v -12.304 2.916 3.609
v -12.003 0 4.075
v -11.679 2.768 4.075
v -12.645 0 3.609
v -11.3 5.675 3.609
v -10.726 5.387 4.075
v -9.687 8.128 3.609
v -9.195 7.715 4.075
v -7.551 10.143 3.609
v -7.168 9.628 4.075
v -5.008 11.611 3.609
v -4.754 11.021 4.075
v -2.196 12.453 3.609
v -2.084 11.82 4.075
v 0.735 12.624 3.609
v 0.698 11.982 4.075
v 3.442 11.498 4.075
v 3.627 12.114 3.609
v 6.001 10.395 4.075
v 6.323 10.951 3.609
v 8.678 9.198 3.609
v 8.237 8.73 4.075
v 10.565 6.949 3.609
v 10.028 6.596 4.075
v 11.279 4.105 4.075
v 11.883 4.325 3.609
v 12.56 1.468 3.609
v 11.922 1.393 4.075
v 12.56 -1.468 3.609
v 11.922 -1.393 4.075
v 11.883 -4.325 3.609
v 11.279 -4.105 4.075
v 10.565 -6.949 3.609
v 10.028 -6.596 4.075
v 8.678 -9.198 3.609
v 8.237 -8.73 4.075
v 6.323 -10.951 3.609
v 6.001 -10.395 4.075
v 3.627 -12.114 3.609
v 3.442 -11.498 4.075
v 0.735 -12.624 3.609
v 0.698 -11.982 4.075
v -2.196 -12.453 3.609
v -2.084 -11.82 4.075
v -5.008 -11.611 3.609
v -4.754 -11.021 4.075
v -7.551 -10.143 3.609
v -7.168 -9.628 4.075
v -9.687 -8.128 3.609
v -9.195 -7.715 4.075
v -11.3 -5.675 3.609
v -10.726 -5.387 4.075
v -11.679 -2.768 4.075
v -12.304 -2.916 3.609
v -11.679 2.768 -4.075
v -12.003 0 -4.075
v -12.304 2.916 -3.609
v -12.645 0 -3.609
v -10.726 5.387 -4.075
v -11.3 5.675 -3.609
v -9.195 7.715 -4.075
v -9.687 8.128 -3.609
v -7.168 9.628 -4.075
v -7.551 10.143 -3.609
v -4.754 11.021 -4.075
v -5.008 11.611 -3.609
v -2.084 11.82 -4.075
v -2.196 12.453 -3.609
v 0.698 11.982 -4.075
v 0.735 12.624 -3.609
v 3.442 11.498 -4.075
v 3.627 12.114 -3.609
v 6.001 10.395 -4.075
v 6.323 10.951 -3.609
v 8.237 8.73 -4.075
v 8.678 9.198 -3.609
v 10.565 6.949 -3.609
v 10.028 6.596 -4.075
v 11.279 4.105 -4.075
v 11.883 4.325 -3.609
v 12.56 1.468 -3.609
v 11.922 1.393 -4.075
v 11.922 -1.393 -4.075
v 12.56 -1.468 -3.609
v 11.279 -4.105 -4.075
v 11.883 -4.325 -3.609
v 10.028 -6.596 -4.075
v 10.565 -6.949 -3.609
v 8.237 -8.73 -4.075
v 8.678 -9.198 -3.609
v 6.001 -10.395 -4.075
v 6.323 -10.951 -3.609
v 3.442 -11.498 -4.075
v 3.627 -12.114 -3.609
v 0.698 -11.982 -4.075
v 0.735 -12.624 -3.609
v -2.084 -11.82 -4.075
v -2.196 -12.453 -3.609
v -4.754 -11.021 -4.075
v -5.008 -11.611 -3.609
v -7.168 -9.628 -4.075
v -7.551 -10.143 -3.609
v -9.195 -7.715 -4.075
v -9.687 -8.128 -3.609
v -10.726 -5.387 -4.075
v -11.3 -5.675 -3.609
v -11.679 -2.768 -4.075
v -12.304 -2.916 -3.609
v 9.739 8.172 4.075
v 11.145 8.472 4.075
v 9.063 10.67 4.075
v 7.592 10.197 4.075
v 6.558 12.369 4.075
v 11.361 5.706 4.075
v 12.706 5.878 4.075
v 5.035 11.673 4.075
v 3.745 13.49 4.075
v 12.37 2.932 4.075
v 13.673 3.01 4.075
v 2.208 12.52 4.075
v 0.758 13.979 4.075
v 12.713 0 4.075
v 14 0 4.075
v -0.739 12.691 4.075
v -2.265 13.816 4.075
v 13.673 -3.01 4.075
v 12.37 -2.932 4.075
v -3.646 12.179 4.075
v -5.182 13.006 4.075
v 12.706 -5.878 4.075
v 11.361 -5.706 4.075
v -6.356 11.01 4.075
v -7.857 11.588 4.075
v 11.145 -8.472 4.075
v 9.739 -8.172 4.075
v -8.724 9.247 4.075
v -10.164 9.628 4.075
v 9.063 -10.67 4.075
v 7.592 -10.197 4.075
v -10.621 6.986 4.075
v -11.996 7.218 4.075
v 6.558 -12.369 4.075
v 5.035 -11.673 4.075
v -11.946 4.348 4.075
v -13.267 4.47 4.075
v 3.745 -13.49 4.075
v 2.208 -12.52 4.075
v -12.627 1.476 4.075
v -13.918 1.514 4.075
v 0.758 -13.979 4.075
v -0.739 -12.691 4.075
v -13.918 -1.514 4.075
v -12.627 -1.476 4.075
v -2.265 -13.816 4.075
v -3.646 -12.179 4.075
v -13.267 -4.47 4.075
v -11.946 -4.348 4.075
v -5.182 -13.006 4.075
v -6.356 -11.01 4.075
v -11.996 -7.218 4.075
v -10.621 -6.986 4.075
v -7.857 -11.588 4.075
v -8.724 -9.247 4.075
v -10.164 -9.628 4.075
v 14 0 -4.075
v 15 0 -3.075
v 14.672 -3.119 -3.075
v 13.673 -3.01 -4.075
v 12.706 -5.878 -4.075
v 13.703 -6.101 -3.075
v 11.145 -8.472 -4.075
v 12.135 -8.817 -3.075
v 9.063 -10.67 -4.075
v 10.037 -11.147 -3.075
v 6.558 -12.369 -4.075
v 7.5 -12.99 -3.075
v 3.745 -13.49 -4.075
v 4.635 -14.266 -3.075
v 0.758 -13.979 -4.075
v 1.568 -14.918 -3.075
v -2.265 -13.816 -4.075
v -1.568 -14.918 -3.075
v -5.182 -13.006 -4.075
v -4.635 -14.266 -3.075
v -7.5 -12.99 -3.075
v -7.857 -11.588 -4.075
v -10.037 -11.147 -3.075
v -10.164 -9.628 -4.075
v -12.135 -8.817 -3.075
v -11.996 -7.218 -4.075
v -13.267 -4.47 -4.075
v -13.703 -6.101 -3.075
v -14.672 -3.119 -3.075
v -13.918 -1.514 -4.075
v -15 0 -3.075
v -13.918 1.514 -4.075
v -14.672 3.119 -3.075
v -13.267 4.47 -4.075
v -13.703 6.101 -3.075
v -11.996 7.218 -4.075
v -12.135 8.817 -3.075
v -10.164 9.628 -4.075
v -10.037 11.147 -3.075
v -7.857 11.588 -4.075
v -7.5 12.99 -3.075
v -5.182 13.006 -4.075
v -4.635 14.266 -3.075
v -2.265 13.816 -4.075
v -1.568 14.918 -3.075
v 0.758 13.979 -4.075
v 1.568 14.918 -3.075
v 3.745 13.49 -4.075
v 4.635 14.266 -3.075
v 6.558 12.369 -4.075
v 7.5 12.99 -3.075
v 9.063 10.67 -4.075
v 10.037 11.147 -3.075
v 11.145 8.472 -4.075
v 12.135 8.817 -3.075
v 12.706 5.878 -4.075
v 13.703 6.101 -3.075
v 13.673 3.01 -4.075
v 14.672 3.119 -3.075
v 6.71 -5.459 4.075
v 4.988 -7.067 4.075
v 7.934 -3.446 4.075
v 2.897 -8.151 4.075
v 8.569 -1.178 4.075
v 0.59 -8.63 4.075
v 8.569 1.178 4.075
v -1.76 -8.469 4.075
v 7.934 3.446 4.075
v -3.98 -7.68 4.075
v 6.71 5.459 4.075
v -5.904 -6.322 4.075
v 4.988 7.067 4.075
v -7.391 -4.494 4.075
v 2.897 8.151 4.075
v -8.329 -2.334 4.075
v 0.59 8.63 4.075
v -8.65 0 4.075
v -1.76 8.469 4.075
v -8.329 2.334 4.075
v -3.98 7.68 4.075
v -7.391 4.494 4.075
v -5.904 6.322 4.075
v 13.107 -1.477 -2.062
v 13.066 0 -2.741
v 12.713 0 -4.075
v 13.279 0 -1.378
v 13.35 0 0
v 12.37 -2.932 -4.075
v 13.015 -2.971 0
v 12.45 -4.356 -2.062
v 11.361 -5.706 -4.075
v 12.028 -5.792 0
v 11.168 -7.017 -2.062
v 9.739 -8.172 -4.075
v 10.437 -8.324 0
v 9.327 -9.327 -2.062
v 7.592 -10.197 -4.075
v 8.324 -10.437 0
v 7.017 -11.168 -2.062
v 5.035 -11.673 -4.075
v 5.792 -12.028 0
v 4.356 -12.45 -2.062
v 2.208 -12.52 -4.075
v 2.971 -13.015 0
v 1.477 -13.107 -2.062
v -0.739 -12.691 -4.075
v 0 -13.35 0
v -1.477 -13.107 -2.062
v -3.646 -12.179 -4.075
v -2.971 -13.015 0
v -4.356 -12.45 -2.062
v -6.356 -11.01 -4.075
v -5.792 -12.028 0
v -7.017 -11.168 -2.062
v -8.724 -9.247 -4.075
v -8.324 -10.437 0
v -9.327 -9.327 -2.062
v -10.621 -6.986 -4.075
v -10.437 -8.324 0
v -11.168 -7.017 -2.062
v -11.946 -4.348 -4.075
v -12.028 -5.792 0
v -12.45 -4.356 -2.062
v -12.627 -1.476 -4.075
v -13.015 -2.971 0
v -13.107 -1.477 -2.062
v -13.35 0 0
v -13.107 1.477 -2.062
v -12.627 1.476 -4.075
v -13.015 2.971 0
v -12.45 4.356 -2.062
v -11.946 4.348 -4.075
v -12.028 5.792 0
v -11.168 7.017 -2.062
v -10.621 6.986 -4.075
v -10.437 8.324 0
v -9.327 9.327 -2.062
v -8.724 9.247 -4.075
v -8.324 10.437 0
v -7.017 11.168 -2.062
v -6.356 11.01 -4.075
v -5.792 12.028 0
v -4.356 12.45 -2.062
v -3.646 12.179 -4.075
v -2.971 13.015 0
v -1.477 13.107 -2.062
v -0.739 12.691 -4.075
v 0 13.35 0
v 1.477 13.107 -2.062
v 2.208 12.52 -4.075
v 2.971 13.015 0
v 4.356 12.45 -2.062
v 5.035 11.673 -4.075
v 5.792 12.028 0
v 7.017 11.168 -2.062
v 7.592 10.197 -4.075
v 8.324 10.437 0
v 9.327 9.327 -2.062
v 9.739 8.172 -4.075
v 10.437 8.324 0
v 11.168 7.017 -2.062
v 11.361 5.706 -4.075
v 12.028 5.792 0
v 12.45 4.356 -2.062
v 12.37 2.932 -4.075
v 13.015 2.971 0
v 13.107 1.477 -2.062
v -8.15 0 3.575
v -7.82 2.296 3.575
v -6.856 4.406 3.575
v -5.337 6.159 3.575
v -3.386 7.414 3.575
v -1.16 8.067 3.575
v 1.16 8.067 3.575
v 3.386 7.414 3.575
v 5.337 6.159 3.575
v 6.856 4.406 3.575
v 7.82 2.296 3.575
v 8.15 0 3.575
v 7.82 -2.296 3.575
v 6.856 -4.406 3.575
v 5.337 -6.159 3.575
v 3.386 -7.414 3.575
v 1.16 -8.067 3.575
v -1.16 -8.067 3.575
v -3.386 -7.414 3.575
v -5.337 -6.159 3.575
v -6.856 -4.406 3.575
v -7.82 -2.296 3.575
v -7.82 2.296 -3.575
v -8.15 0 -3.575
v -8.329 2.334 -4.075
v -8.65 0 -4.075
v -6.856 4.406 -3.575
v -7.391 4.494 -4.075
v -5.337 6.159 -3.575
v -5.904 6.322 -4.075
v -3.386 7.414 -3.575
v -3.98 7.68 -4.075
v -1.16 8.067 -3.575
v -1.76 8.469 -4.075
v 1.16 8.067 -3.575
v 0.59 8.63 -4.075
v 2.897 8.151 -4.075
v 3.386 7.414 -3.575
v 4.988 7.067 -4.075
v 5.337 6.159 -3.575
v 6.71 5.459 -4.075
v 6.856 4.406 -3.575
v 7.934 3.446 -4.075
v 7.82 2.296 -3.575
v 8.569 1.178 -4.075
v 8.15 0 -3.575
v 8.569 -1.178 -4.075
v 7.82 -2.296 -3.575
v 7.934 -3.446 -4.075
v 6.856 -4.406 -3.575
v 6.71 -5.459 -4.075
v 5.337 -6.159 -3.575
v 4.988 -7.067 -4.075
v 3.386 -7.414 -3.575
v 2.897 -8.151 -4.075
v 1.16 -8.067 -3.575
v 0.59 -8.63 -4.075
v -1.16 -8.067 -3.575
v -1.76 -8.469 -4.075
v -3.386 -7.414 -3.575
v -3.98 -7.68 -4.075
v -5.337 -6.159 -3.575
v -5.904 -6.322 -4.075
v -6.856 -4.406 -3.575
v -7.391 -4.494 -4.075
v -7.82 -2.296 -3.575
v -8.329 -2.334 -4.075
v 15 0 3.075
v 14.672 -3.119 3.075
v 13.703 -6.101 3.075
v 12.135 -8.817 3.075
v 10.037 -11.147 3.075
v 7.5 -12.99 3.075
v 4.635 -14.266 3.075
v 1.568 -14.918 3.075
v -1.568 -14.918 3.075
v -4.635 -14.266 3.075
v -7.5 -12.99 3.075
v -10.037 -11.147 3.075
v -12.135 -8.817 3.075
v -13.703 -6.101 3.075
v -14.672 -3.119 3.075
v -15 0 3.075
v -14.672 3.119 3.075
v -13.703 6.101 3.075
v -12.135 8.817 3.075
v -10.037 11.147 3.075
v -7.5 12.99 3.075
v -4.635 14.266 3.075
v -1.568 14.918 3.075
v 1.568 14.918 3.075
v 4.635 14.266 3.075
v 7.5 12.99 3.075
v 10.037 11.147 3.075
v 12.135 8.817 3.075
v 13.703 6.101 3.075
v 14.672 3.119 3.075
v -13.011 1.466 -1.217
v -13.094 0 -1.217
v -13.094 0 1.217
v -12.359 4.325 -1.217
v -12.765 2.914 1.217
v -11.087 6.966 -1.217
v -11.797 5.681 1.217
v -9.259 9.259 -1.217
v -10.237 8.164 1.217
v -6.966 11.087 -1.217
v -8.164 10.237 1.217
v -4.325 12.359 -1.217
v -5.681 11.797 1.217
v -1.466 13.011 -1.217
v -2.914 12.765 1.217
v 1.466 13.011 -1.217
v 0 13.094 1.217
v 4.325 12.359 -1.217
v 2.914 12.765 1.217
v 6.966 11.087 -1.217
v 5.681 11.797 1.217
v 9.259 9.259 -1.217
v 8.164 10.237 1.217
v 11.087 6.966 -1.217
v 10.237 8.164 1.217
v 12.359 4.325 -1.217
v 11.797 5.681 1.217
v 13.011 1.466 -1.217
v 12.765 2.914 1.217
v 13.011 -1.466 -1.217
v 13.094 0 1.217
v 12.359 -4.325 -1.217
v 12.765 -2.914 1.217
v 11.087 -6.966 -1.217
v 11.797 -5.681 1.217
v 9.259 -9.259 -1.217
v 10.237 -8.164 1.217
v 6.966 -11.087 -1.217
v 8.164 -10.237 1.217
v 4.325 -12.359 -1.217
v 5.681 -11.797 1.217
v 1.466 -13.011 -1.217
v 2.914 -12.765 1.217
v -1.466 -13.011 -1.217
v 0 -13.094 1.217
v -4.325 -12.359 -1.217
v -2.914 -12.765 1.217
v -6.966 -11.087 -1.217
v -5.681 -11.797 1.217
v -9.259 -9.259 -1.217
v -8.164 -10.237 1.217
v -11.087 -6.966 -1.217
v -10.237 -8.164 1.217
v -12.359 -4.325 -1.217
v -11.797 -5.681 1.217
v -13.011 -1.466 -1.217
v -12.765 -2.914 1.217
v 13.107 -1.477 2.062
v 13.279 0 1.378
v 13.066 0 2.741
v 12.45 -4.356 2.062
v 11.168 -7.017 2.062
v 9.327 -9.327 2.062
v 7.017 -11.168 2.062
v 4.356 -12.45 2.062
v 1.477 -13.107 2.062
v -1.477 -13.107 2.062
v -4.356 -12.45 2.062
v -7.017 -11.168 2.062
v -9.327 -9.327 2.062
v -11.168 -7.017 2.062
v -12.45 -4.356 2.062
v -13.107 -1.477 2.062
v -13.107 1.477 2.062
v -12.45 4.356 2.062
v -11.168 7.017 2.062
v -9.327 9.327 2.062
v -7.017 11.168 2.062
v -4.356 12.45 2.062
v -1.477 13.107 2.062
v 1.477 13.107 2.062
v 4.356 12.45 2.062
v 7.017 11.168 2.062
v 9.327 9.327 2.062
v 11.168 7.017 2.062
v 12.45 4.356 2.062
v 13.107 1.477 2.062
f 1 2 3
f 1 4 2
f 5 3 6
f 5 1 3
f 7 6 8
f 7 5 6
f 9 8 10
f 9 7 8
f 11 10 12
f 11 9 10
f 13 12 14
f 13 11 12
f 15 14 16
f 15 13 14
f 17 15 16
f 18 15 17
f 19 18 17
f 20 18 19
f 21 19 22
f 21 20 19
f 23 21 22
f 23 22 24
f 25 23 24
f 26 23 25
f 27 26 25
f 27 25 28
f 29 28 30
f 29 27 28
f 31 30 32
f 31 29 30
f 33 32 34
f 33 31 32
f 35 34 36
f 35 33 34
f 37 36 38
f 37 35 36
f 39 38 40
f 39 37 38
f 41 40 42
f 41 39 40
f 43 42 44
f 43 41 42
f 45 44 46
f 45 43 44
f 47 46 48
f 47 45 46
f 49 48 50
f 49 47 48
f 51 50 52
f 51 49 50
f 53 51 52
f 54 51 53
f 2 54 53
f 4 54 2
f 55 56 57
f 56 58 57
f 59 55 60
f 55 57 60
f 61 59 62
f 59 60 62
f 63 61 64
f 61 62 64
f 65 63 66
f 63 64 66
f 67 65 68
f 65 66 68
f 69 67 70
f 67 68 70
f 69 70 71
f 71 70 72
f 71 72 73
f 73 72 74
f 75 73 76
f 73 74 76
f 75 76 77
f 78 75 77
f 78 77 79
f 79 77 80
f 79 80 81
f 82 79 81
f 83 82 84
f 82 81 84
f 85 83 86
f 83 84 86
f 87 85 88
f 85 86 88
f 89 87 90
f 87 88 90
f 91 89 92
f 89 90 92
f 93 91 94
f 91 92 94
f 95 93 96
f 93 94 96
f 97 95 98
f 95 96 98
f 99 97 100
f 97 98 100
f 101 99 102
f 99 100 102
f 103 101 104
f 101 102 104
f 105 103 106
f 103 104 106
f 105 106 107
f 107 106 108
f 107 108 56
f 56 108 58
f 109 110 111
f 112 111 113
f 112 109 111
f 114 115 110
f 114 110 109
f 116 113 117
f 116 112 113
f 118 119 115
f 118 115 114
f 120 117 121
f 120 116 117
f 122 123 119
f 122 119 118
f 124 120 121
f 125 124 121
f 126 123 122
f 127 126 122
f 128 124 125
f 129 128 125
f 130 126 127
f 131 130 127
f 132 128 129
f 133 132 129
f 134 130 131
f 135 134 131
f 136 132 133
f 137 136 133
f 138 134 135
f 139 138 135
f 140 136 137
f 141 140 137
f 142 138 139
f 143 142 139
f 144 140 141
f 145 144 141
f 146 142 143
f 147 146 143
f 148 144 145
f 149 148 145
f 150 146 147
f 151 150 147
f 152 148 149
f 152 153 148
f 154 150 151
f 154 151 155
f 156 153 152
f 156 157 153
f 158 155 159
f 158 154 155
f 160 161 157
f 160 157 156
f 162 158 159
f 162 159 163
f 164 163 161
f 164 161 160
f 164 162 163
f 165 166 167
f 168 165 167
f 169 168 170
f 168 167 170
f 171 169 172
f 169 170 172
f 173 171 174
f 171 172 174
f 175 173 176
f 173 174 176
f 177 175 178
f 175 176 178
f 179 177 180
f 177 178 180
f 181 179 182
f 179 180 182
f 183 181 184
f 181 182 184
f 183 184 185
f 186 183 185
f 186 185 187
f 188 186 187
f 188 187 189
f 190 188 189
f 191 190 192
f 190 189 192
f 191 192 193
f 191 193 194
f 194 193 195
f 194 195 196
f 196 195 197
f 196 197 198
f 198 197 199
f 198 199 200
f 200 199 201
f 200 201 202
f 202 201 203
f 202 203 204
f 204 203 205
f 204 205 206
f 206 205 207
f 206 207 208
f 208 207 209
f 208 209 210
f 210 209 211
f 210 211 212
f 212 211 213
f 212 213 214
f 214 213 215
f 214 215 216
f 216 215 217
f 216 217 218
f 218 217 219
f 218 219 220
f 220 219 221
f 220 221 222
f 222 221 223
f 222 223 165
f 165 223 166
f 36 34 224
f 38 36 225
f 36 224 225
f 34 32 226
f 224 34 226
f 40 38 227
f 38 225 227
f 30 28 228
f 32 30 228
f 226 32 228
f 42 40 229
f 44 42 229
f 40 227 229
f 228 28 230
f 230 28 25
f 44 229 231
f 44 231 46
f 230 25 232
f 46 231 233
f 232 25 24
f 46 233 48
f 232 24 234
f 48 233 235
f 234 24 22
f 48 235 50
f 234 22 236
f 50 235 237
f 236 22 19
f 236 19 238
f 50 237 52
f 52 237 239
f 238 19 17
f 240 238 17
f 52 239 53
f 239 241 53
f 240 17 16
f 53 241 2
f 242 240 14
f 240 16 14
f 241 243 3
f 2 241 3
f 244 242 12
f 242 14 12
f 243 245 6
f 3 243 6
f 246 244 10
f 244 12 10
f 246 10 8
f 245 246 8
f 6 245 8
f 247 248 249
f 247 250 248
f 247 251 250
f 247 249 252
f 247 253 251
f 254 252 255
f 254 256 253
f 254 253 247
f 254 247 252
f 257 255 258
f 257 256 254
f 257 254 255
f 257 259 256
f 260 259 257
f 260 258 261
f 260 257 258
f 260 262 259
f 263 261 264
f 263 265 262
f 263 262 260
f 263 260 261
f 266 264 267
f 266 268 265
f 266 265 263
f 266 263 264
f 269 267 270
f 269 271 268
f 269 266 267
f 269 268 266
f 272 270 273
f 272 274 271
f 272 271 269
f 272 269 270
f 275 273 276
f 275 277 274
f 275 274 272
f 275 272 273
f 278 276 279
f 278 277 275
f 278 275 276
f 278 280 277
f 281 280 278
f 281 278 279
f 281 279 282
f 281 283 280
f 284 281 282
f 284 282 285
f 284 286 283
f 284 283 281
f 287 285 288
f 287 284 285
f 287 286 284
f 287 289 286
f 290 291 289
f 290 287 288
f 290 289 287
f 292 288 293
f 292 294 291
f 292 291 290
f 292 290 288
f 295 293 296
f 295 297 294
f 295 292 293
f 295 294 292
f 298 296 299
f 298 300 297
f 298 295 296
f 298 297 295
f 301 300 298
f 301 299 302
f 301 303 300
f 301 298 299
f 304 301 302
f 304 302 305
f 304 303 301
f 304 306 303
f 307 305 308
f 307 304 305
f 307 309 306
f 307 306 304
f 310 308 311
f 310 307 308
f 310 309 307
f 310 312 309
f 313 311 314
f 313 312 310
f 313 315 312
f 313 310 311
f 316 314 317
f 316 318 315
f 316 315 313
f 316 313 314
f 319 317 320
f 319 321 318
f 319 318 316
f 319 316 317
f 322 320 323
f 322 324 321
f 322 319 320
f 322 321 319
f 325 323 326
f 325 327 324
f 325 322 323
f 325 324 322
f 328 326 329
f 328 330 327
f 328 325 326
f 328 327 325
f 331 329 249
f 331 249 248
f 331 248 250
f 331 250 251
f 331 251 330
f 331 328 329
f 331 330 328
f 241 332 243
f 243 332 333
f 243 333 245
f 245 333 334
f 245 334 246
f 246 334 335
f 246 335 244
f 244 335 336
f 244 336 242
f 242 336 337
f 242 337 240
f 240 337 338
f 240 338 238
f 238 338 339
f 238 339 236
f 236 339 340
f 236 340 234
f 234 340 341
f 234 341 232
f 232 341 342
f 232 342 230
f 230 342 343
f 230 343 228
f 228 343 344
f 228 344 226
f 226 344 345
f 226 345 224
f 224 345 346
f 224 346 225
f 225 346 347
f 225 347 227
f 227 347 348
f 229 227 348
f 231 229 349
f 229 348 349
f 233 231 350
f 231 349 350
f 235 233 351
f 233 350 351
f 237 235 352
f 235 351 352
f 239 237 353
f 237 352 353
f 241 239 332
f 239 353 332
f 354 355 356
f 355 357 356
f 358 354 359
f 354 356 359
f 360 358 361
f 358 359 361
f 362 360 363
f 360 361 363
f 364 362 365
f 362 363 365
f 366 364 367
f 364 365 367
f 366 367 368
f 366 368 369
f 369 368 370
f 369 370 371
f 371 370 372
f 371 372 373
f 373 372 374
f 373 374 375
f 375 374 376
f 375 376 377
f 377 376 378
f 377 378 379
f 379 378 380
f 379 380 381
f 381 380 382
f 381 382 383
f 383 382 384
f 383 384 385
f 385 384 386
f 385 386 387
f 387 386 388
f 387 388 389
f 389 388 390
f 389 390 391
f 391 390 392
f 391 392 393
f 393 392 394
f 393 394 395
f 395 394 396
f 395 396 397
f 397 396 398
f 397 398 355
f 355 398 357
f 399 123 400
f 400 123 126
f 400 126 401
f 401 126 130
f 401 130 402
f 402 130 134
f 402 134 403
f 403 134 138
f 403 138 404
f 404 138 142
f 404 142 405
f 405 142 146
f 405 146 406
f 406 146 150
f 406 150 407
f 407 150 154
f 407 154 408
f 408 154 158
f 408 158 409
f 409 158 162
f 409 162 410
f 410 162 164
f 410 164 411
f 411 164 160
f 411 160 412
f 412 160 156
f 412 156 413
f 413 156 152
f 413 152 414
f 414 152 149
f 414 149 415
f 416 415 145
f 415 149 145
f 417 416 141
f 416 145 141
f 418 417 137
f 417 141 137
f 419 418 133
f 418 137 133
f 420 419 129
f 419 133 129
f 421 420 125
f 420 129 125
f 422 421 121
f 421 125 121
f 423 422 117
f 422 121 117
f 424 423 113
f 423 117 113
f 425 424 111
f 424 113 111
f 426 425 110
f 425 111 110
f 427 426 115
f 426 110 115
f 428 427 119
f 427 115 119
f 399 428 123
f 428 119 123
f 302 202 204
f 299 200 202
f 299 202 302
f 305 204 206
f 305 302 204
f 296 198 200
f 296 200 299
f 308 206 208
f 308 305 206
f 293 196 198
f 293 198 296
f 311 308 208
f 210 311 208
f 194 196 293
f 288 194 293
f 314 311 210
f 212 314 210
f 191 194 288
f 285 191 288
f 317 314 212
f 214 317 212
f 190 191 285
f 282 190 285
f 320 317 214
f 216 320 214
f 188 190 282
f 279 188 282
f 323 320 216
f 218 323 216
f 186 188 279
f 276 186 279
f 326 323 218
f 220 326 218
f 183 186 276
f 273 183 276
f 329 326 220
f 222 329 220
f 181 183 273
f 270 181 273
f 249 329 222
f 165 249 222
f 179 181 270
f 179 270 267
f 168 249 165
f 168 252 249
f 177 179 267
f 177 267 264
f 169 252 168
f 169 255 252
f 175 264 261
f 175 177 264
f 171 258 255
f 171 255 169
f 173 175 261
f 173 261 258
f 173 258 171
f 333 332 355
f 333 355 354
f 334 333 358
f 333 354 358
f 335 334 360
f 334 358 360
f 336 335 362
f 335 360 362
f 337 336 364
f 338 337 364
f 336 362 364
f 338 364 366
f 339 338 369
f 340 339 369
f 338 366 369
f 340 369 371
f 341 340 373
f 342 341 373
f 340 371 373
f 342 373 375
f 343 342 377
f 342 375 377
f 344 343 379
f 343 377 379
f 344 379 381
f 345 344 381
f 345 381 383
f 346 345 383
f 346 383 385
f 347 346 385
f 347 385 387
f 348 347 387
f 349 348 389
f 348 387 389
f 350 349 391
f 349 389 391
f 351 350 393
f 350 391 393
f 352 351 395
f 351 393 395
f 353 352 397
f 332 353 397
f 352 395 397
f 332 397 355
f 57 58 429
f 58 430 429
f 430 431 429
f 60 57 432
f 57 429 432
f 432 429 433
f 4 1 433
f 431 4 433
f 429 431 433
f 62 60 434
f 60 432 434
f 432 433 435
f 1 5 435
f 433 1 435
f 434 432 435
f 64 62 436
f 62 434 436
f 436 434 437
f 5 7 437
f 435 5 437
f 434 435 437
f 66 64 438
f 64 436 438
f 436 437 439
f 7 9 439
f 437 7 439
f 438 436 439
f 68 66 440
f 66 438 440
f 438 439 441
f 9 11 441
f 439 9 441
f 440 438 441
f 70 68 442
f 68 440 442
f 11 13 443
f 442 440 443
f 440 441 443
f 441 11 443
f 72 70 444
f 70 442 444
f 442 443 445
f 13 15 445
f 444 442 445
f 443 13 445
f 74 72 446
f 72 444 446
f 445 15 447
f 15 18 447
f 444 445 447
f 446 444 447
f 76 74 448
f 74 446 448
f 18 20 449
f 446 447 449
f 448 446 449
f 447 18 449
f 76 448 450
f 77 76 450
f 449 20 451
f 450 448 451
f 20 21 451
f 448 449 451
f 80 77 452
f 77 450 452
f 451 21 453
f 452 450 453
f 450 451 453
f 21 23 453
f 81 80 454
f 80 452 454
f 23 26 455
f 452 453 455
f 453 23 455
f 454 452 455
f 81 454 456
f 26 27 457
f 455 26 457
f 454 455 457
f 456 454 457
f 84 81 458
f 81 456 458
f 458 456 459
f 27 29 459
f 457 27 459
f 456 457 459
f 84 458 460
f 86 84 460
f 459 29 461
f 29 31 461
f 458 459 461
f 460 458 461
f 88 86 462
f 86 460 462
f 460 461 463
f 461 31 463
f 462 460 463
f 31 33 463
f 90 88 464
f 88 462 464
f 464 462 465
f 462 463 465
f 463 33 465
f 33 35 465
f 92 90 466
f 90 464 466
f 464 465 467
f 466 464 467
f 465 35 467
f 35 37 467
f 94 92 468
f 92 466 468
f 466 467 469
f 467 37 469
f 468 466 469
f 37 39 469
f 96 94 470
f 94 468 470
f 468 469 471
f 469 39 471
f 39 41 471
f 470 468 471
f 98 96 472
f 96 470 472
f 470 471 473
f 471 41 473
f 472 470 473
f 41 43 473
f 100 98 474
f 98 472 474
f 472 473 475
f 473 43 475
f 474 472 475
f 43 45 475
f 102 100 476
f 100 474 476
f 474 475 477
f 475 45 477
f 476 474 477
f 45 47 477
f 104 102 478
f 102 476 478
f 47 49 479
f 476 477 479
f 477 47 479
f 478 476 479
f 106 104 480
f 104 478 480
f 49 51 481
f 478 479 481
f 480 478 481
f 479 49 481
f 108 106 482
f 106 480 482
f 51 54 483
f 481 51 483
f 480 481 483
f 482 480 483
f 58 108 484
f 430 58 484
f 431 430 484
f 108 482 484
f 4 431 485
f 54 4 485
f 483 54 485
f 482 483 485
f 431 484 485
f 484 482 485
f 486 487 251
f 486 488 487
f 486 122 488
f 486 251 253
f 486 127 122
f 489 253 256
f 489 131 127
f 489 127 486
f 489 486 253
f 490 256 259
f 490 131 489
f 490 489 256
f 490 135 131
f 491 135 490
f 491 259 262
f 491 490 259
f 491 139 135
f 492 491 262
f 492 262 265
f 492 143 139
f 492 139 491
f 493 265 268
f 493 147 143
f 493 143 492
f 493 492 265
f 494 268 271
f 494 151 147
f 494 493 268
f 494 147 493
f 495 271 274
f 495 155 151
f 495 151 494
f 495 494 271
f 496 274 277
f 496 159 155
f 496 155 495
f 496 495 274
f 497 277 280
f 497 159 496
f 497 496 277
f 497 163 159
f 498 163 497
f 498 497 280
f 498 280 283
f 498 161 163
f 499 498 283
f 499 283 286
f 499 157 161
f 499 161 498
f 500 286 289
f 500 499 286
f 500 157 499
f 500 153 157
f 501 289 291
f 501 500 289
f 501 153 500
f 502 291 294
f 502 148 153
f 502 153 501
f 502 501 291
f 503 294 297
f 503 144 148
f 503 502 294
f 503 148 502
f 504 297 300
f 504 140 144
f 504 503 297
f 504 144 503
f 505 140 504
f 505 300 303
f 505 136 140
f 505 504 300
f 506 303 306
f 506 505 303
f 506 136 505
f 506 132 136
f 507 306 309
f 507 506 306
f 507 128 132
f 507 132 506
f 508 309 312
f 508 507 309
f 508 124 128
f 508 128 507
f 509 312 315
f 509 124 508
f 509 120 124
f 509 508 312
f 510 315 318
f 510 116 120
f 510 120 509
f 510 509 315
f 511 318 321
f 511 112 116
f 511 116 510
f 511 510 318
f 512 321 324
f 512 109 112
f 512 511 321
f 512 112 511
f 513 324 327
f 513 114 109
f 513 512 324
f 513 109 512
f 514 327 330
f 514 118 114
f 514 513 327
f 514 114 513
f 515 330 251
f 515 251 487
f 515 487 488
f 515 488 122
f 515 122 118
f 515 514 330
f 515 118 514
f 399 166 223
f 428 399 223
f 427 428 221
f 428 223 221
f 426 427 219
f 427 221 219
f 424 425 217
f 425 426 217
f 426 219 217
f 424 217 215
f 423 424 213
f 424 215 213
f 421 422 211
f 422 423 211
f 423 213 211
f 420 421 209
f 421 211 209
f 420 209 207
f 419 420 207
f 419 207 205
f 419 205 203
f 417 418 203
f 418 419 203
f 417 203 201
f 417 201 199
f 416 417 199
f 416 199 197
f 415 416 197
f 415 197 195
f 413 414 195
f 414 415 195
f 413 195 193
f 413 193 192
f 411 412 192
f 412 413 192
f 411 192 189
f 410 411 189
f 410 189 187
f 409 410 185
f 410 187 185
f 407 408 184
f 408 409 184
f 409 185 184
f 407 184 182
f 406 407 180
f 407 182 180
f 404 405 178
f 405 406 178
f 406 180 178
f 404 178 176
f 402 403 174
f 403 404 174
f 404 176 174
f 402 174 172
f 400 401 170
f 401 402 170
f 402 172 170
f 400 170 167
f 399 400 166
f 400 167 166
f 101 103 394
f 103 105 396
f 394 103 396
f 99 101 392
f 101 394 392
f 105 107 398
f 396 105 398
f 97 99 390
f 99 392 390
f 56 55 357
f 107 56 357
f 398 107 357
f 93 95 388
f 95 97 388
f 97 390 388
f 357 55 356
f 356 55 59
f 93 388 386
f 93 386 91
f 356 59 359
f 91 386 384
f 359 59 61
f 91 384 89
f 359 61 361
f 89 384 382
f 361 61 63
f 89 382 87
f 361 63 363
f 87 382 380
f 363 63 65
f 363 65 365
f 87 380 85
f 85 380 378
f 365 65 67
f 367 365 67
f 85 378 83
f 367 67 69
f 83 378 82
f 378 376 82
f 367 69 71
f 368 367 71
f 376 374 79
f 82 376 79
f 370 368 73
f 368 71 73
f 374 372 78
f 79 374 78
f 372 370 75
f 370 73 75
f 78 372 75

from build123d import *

# Parameters (mm, degrees)
CUT_EXTRUDE1_DEPTH      = 24.200228986
CUT_EXTRUDE1_DEPTH_BACK = 24.200228986
SKETCH7_R               = 18.62743981
SKETCH7_R_2             = 15.62743981
CUT_EXTRUDE2_DEPTH      = 23.473081119
CUT_EXTRUDE2_DEPTH_BACK = 23.473081119
SKETCH9_R               = 15.62743981
SKETCH9_R_2             = 15
CHAMFER1_SIZE           = 1
CHAMFER3_SIZE           = 0.5


with BuildPart() as part:
    # Sketch4 → Revolve4 (revolve)
    with BuildSketch(Plane(origin=(0, 0, 0), x_dir=(1, 0, 0), z_dir=(0, 1, 0))):
        with BuildLine():
            Line((-8.15, -4.075), (-8.15, 0))
            Line((-8.15, 0), (-8.15, 4.075))
            Line((-8.15, 4.075), (-12.502674714, 4.075))
            ThreePointArc((-12.502674714, 4.075), (-13.15, 0), (-12.502674714, -4.075))
            Line((-12.502674714, -4.075), (-8.15, -4.075))
        make_face()
    revolve(axis=Axis((0, 0, 13.15), (0, 0, -1)))

    # Chamfer3
    # the kernel refuses this chamfer: 0.5 mm, written as the material it takes off along each edge
    with BuildSketch(Plane(origin=(0, 0, -4.075), x_dir=(-1, 0, 0), z_dir=(0, -1, 0))) as chamfer3_piece_1:
        Polygon((8.15, -CHAMFER3_SIZE), (8.15 + CHAMFER3_SIZE, 0), (8.15, 0), align=None)
    revolve(axis=Axis((0, 0, -4.075), (0, 0, -1)), mode=Mode.SUBTRACT)
    with BuildSketch(Plane(origin=(0, 0, 4.075), x_dir=(-1, 0, 0), z_dir=(0, -1, 0))) as chamfer3_piece_2:
        Polygon((8.15 + CHAMFER3_SIZE, 0), (8.15, CHAMFER3_SIZE), (8.15, 0), align=None)
    revolve(axis=Axis((0, 0, 4.075), (0, 0, -1)), mode=Mode.SUBTRACT)
    with BuildSketch(Plane(origin=(0, 0, 4.075), x_dir=(-1, 0, 0), z_dir=(0, -1, 0))) as chamfer3_piece_3:
        with BuildLine():
            Line((12.502674714 - CHAMFER3_SIZE, 0), (12.645161709, 0.466345772))
            ThreePointArc((12.645161709, 0.466345772), (12.578409578, 0.240145049), (12.502674714, 0))
            Line((12.502674714, 0), (12.502674714 - CHAMFER3_SIZE, 0))
        make_face()
    revolve(axis=Axis((0, 0, 4.075), (0, 0, -1)), mode=Mode.SUBTRACT)
    with BuildSketch(Plane(origin=(0, 0, -4.075), x_dir=(-1, 0, 0), z_dir=(0, -1, 0))) as chamfer3_piece_4:
        with BuildLine():
            Line((12.502674714 - CHAMFER3_SIZE, 0), (12.645161709, -0.466345772))
            ThreePointArc((12.645161709, -0.466345772), (12.578409578, -0.240145049), (12.502674714, 0))
            Line((12.502674714, 0), (12.502674714 - CHAMFER3_SIZE, 0))
        make_face()
    revolve(axis=Axis((0, 0, -4.075), (0, 0, -1)), mode=Mode.SUBTRACT)


with BuildPart() as body_2:
    # Sketch6 → Revolve5 (revolve)
    with BuildSketch(Plane(origin=(0, 0, 0), x_dir=(1, 0, 0), z_dir=(0, 1, 0))):
        with BuildLine():
            ThreePointArc((-12.712862581, -4.075), (-13.35, 0), (-12.712862581, 4.075))
            Line((-12.712862581, 4.075), (-15.62743981, 4.075))
            ThreePointArc((-15.62743981, 4.075), (-16.15, 0), (-15.62743981, -4.075))
            Line((-15.62743981, -4.075), (-12.712862581, -4.075))
        make_face()
        with BuildLine():
            Line((15.62743981, 4.075), (12.712862581, 4.075))
            ThreePointArc((12.712862581, 4.075), (13.189753892, 2.062254173), (13.35, 0))
            ThreePointArc((13.35, 0), (13.189753892, -2.062254173), (12.712862581, -4.075))
            Line((12.712862581, -4.075), (15.62743981, -4.075))
            ThreePointArc((15.62743981, -4.075), (16.01882725, -2.054184397), (16.15, 0))
            ThreePointArc((16.15, 0), (16.01882725, 2.054184397), (15.62743981, 4.075))
        make_face()
    revolve(axis=Axis((0, 0, 13.15), (0, 0, -1)))

    # Sketch7 → Cut-Extrude1 (cut, two sides: drawn at the far end of the back side and taken through both)
    with BuildSketch(Plane.XY.offset(-CUT_EXTRUDE1_DEPTH_BACK)):
        Circle(SKETCH7_R)
        Circle(SKETCH7_R_2, mode=Mode.SUBTRACT)
    extrude(amount=CUT_EXTRUDE1_DEPTH + CUT_EXTRUDE1_DEPTH_BACK, mode=Mode.SUBTRACT)

    # Sketch9 → Cut-Extrude2 (cut, two sides: drawn at the far end of the back side and taken through both)
    with BuildSketch(Plane.XY.offset(-CUT_EXTRUDE2_DEPTH_BACK)):
        Circle(SKETCH9_R)
        Circle(SKETCH9_R_2, mode=Mode.SUBTRACT)
    extrude(amount=CUT_EXTRUDE2_DEPTH + CUT_EXTRUDE2_DEPTH_BACK, mode=Mode.SUBTRACT)

    # Chamfer1
    chamfer1_edges = [body_2.edges().sort_by_distance(p)[0] for p in [
        (-15, 0, -4.075),
        (-15, 0, 4.075),
    ]]
    chamfer(chamfer1_edges, length=CHAMFER1_SIZE)


solid = Compound([part.part, body_2.part])
